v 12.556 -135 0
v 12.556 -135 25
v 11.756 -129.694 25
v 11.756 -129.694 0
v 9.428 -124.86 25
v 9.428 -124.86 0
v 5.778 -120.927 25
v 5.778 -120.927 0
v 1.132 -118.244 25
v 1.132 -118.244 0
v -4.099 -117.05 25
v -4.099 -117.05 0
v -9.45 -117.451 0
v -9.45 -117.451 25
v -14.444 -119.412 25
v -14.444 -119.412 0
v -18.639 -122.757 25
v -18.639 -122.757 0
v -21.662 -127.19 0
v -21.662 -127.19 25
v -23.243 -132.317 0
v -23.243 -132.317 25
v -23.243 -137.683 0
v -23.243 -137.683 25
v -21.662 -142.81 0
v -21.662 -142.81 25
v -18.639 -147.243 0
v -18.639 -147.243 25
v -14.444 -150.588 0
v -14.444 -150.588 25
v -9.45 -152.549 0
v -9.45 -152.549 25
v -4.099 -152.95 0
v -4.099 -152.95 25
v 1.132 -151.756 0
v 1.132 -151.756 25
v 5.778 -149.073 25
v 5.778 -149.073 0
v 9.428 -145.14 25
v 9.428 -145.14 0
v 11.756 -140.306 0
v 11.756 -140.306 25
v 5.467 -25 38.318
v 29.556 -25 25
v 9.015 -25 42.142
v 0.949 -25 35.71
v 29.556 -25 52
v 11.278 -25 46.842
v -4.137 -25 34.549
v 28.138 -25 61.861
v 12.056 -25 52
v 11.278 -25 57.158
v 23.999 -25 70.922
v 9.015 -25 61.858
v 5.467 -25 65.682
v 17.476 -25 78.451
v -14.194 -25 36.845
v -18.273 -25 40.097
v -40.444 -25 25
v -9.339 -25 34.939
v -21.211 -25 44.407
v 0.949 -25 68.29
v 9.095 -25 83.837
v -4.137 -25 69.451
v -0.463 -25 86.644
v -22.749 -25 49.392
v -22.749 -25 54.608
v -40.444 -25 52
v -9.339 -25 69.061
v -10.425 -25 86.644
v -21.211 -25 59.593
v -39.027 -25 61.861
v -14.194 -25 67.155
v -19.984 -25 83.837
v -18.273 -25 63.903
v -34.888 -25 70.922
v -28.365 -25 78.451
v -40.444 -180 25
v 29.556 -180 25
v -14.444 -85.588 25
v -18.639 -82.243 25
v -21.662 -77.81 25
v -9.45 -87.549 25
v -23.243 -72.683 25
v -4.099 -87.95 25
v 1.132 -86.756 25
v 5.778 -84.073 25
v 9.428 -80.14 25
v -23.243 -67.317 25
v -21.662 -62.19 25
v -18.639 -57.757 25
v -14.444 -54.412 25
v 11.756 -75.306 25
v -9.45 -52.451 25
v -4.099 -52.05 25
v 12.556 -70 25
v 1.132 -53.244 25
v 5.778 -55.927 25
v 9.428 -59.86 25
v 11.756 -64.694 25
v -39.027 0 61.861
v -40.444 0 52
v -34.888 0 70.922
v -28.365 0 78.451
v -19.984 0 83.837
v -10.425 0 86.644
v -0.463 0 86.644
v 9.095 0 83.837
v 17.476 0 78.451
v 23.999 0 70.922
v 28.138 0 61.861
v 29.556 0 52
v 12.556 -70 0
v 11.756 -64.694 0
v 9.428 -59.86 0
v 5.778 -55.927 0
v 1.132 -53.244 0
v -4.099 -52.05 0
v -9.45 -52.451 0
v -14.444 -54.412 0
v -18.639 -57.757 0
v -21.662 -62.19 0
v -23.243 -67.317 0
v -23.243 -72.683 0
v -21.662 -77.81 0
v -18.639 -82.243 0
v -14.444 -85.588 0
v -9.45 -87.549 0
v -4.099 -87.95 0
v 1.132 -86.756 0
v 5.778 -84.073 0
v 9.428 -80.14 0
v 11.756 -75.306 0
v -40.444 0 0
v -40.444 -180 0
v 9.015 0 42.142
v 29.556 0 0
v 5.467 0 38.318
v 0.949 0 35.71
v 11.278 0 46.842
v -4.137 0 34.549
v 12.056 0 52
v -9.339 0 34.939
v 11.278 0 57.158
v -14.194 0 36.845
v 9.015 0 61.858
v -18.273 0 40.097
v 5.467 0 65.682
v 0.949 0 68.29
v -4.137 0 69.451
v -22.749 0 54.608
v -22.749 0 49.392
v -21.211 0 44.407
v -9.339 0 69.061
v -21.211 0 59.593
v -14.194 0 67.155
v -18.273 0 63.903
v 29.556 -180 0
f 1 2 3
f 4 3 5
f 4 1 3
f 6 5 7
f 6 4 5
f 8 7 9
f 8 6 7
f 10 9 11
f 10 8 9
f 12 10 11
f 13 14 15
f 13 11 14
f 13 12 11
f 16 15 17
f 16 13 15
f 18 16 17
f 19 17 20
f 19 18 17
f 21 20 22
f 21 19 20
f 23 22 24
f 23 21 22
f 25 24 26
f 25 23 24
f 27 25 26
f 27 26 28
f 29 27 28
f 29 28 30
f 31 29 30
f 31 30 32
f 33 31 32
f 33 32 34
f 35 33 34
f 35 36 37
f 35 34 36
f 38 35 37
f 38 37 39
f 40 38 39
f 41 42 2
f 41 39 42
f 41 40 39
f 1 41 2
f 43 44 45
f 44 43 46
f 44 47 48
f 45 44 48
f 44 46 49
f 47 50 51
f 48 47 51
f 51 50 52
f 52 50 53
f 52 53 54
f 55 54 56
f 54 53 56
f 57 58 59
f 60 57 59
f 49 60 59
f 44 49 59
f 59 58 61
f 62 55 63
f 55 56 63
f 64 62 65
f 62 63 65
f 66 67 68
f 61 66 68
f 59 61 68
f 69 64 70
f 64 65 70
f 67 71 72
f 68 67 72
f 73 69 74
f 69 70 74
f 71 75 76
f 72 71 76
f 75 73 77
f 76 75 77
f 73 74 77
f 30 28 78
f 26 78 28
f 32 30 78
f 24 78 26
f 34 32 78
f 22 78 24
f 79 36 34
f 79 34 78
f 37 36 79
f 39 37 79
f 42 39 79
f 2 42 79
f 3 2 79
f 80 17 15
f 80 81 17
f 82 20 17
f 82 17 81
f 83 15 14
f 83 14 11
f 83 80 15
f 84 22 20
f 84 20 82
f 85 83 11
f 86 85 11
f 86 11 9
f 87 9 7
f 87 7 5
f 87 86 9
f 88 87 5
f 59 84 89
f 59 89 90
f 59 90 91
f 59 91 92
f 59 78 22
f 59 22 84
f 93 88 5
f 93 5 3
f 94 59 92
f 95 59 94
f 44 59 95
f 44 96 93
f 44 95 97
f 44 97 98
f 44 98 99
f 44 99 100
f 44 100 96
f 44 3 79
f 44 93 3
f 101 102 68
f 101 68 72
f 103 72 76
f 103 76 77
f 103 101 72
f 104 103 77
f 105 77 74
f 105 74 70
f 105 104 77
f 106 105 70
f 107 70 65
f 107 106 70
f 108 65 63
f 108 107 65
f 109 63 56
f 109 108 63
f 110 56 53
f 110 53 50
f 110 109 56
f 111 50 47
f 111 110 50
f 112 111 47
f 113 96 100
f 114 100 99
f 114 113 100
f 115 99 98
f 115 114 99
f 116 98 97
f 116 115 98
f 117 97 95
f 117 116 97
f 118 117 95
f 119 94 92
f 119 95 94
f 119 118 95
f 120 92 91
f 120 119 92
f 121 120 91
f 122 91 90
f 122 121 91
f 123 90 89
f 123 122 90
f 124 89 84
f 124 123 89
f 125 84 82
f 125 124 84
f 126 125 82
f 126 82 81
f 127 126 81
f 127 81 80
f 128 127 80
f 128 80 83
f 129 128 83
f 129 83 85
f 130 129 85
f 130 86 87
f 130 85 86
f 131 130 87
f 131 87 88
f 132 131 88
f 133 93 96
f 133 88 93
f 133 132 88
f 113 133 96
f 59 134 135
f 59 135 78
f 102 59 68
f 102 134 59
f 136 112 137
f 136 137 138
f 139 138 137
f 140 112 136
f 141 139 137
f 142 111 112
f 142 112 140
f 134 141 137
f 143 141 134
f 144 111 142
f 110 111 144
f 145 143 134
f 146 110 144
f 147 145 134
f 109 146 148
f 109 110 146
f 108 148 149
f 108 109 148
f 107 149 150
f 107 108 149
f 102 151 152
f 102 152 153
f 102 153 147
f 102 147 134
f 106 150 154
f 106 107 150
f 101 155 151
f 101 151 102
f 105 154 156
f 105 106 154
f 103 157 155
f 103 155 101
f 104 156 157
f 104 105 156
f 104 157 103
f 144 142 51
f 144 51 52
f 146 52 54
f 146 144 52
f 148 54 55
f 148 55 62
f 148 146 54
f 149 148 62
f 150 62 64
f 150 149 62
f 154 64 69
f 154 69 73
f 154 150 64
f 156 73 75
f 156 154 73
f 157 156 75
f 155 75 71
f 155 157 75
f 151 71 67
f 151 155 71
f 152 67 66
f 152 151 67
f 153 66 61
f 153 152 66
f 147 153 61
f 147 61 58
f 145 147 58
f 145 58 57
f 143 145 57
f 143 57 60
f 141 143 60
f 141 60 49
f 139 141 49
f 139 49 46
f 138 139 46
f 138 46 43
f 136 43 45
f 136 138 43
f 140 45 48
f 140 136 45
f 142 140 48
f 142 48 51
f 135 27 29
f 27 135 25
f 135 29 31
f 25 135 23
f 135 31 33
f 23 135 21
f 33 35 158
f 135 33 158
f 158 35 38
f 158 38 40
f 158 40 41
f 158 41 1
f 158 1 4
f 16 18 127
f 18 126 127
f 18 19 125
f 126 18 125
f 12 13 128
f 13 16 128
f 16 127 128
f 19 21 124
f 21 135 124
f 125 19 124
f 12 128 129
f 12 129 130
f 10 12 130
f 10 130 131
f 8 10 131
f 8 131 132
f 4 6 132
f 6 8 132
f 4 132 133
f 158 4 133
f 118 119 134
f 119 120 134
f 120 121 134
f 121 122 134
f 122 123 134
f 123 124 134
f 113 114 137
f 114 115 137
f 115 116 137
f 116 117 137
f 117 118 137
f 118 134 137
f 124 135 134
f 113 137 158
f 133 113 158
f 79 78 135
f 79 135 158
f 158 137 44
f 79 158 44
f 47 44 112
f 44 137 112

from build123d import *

# Parameters (mm, degrees)
F0_W     = 70
F0_H     = 52
F1_DEPTH = 180
F2_W     = 70
F2_H     = 155
F3_DEPTH = 27
F5_DEPTH = 25
F6_R     = 17.5
F7_DEPTH = 25
F8_R     = 18
F9_DEPTH = 87.001


with BuildPart() as f1:
    # F0 (on Front) → F1 (new body)
    with BuildSketch(Plane.XZ):
        with Locations((-5.444441, 26)):
            Rectangle(F0_W, F0_H)
    extrude(amount=F1_DEPTH)

    # F2 (on face) → F3 (cut)
    with BuildSketch(Plane.XY.offset(52)):
        with Locations((-5.444441, -102.5)):
            Rectangle(F2_W, F2_H)
    extrude(amount=-F3_DEPTH, mode=Mode.SUBTRACT)

    # F4 (on face) → F5 (join)
    with BuildSketch(Plane(origin=(0, 0, 0), x_dir=(-1, 0, 0), z_dir=(0, 1, 0))):
        with BuildLine():
            Line((-29.555559, 52), (40.444441, 52))
            ThreePointArc((40.444441, 52), (5.444441, 87), (-29.555559, 52))
        make_face()
    extrude(amount=-F5_DEPTH)

    # F6 (on Front) → F7 (cut)
    with BuildSketch(Plane.XZ):
        with Locations((-5.444441, 52)):
            Circle(F6_R)
    extrude(amount=F7_DEPTH, mode=Mode.SUBTRACT)

    # F8 (on Top) → F9 (cut, through all)
    with BuildSketch(Plane.XY):
        with Locations((-5.444441, -70)):
            Circle(F8_R)
        with Locations((-5.444441, -135)):
            Circle(F8_R)
    extrude(amount=F9_DEPTH, mode=Mode.SUBTRACT)


solid = f1.part
